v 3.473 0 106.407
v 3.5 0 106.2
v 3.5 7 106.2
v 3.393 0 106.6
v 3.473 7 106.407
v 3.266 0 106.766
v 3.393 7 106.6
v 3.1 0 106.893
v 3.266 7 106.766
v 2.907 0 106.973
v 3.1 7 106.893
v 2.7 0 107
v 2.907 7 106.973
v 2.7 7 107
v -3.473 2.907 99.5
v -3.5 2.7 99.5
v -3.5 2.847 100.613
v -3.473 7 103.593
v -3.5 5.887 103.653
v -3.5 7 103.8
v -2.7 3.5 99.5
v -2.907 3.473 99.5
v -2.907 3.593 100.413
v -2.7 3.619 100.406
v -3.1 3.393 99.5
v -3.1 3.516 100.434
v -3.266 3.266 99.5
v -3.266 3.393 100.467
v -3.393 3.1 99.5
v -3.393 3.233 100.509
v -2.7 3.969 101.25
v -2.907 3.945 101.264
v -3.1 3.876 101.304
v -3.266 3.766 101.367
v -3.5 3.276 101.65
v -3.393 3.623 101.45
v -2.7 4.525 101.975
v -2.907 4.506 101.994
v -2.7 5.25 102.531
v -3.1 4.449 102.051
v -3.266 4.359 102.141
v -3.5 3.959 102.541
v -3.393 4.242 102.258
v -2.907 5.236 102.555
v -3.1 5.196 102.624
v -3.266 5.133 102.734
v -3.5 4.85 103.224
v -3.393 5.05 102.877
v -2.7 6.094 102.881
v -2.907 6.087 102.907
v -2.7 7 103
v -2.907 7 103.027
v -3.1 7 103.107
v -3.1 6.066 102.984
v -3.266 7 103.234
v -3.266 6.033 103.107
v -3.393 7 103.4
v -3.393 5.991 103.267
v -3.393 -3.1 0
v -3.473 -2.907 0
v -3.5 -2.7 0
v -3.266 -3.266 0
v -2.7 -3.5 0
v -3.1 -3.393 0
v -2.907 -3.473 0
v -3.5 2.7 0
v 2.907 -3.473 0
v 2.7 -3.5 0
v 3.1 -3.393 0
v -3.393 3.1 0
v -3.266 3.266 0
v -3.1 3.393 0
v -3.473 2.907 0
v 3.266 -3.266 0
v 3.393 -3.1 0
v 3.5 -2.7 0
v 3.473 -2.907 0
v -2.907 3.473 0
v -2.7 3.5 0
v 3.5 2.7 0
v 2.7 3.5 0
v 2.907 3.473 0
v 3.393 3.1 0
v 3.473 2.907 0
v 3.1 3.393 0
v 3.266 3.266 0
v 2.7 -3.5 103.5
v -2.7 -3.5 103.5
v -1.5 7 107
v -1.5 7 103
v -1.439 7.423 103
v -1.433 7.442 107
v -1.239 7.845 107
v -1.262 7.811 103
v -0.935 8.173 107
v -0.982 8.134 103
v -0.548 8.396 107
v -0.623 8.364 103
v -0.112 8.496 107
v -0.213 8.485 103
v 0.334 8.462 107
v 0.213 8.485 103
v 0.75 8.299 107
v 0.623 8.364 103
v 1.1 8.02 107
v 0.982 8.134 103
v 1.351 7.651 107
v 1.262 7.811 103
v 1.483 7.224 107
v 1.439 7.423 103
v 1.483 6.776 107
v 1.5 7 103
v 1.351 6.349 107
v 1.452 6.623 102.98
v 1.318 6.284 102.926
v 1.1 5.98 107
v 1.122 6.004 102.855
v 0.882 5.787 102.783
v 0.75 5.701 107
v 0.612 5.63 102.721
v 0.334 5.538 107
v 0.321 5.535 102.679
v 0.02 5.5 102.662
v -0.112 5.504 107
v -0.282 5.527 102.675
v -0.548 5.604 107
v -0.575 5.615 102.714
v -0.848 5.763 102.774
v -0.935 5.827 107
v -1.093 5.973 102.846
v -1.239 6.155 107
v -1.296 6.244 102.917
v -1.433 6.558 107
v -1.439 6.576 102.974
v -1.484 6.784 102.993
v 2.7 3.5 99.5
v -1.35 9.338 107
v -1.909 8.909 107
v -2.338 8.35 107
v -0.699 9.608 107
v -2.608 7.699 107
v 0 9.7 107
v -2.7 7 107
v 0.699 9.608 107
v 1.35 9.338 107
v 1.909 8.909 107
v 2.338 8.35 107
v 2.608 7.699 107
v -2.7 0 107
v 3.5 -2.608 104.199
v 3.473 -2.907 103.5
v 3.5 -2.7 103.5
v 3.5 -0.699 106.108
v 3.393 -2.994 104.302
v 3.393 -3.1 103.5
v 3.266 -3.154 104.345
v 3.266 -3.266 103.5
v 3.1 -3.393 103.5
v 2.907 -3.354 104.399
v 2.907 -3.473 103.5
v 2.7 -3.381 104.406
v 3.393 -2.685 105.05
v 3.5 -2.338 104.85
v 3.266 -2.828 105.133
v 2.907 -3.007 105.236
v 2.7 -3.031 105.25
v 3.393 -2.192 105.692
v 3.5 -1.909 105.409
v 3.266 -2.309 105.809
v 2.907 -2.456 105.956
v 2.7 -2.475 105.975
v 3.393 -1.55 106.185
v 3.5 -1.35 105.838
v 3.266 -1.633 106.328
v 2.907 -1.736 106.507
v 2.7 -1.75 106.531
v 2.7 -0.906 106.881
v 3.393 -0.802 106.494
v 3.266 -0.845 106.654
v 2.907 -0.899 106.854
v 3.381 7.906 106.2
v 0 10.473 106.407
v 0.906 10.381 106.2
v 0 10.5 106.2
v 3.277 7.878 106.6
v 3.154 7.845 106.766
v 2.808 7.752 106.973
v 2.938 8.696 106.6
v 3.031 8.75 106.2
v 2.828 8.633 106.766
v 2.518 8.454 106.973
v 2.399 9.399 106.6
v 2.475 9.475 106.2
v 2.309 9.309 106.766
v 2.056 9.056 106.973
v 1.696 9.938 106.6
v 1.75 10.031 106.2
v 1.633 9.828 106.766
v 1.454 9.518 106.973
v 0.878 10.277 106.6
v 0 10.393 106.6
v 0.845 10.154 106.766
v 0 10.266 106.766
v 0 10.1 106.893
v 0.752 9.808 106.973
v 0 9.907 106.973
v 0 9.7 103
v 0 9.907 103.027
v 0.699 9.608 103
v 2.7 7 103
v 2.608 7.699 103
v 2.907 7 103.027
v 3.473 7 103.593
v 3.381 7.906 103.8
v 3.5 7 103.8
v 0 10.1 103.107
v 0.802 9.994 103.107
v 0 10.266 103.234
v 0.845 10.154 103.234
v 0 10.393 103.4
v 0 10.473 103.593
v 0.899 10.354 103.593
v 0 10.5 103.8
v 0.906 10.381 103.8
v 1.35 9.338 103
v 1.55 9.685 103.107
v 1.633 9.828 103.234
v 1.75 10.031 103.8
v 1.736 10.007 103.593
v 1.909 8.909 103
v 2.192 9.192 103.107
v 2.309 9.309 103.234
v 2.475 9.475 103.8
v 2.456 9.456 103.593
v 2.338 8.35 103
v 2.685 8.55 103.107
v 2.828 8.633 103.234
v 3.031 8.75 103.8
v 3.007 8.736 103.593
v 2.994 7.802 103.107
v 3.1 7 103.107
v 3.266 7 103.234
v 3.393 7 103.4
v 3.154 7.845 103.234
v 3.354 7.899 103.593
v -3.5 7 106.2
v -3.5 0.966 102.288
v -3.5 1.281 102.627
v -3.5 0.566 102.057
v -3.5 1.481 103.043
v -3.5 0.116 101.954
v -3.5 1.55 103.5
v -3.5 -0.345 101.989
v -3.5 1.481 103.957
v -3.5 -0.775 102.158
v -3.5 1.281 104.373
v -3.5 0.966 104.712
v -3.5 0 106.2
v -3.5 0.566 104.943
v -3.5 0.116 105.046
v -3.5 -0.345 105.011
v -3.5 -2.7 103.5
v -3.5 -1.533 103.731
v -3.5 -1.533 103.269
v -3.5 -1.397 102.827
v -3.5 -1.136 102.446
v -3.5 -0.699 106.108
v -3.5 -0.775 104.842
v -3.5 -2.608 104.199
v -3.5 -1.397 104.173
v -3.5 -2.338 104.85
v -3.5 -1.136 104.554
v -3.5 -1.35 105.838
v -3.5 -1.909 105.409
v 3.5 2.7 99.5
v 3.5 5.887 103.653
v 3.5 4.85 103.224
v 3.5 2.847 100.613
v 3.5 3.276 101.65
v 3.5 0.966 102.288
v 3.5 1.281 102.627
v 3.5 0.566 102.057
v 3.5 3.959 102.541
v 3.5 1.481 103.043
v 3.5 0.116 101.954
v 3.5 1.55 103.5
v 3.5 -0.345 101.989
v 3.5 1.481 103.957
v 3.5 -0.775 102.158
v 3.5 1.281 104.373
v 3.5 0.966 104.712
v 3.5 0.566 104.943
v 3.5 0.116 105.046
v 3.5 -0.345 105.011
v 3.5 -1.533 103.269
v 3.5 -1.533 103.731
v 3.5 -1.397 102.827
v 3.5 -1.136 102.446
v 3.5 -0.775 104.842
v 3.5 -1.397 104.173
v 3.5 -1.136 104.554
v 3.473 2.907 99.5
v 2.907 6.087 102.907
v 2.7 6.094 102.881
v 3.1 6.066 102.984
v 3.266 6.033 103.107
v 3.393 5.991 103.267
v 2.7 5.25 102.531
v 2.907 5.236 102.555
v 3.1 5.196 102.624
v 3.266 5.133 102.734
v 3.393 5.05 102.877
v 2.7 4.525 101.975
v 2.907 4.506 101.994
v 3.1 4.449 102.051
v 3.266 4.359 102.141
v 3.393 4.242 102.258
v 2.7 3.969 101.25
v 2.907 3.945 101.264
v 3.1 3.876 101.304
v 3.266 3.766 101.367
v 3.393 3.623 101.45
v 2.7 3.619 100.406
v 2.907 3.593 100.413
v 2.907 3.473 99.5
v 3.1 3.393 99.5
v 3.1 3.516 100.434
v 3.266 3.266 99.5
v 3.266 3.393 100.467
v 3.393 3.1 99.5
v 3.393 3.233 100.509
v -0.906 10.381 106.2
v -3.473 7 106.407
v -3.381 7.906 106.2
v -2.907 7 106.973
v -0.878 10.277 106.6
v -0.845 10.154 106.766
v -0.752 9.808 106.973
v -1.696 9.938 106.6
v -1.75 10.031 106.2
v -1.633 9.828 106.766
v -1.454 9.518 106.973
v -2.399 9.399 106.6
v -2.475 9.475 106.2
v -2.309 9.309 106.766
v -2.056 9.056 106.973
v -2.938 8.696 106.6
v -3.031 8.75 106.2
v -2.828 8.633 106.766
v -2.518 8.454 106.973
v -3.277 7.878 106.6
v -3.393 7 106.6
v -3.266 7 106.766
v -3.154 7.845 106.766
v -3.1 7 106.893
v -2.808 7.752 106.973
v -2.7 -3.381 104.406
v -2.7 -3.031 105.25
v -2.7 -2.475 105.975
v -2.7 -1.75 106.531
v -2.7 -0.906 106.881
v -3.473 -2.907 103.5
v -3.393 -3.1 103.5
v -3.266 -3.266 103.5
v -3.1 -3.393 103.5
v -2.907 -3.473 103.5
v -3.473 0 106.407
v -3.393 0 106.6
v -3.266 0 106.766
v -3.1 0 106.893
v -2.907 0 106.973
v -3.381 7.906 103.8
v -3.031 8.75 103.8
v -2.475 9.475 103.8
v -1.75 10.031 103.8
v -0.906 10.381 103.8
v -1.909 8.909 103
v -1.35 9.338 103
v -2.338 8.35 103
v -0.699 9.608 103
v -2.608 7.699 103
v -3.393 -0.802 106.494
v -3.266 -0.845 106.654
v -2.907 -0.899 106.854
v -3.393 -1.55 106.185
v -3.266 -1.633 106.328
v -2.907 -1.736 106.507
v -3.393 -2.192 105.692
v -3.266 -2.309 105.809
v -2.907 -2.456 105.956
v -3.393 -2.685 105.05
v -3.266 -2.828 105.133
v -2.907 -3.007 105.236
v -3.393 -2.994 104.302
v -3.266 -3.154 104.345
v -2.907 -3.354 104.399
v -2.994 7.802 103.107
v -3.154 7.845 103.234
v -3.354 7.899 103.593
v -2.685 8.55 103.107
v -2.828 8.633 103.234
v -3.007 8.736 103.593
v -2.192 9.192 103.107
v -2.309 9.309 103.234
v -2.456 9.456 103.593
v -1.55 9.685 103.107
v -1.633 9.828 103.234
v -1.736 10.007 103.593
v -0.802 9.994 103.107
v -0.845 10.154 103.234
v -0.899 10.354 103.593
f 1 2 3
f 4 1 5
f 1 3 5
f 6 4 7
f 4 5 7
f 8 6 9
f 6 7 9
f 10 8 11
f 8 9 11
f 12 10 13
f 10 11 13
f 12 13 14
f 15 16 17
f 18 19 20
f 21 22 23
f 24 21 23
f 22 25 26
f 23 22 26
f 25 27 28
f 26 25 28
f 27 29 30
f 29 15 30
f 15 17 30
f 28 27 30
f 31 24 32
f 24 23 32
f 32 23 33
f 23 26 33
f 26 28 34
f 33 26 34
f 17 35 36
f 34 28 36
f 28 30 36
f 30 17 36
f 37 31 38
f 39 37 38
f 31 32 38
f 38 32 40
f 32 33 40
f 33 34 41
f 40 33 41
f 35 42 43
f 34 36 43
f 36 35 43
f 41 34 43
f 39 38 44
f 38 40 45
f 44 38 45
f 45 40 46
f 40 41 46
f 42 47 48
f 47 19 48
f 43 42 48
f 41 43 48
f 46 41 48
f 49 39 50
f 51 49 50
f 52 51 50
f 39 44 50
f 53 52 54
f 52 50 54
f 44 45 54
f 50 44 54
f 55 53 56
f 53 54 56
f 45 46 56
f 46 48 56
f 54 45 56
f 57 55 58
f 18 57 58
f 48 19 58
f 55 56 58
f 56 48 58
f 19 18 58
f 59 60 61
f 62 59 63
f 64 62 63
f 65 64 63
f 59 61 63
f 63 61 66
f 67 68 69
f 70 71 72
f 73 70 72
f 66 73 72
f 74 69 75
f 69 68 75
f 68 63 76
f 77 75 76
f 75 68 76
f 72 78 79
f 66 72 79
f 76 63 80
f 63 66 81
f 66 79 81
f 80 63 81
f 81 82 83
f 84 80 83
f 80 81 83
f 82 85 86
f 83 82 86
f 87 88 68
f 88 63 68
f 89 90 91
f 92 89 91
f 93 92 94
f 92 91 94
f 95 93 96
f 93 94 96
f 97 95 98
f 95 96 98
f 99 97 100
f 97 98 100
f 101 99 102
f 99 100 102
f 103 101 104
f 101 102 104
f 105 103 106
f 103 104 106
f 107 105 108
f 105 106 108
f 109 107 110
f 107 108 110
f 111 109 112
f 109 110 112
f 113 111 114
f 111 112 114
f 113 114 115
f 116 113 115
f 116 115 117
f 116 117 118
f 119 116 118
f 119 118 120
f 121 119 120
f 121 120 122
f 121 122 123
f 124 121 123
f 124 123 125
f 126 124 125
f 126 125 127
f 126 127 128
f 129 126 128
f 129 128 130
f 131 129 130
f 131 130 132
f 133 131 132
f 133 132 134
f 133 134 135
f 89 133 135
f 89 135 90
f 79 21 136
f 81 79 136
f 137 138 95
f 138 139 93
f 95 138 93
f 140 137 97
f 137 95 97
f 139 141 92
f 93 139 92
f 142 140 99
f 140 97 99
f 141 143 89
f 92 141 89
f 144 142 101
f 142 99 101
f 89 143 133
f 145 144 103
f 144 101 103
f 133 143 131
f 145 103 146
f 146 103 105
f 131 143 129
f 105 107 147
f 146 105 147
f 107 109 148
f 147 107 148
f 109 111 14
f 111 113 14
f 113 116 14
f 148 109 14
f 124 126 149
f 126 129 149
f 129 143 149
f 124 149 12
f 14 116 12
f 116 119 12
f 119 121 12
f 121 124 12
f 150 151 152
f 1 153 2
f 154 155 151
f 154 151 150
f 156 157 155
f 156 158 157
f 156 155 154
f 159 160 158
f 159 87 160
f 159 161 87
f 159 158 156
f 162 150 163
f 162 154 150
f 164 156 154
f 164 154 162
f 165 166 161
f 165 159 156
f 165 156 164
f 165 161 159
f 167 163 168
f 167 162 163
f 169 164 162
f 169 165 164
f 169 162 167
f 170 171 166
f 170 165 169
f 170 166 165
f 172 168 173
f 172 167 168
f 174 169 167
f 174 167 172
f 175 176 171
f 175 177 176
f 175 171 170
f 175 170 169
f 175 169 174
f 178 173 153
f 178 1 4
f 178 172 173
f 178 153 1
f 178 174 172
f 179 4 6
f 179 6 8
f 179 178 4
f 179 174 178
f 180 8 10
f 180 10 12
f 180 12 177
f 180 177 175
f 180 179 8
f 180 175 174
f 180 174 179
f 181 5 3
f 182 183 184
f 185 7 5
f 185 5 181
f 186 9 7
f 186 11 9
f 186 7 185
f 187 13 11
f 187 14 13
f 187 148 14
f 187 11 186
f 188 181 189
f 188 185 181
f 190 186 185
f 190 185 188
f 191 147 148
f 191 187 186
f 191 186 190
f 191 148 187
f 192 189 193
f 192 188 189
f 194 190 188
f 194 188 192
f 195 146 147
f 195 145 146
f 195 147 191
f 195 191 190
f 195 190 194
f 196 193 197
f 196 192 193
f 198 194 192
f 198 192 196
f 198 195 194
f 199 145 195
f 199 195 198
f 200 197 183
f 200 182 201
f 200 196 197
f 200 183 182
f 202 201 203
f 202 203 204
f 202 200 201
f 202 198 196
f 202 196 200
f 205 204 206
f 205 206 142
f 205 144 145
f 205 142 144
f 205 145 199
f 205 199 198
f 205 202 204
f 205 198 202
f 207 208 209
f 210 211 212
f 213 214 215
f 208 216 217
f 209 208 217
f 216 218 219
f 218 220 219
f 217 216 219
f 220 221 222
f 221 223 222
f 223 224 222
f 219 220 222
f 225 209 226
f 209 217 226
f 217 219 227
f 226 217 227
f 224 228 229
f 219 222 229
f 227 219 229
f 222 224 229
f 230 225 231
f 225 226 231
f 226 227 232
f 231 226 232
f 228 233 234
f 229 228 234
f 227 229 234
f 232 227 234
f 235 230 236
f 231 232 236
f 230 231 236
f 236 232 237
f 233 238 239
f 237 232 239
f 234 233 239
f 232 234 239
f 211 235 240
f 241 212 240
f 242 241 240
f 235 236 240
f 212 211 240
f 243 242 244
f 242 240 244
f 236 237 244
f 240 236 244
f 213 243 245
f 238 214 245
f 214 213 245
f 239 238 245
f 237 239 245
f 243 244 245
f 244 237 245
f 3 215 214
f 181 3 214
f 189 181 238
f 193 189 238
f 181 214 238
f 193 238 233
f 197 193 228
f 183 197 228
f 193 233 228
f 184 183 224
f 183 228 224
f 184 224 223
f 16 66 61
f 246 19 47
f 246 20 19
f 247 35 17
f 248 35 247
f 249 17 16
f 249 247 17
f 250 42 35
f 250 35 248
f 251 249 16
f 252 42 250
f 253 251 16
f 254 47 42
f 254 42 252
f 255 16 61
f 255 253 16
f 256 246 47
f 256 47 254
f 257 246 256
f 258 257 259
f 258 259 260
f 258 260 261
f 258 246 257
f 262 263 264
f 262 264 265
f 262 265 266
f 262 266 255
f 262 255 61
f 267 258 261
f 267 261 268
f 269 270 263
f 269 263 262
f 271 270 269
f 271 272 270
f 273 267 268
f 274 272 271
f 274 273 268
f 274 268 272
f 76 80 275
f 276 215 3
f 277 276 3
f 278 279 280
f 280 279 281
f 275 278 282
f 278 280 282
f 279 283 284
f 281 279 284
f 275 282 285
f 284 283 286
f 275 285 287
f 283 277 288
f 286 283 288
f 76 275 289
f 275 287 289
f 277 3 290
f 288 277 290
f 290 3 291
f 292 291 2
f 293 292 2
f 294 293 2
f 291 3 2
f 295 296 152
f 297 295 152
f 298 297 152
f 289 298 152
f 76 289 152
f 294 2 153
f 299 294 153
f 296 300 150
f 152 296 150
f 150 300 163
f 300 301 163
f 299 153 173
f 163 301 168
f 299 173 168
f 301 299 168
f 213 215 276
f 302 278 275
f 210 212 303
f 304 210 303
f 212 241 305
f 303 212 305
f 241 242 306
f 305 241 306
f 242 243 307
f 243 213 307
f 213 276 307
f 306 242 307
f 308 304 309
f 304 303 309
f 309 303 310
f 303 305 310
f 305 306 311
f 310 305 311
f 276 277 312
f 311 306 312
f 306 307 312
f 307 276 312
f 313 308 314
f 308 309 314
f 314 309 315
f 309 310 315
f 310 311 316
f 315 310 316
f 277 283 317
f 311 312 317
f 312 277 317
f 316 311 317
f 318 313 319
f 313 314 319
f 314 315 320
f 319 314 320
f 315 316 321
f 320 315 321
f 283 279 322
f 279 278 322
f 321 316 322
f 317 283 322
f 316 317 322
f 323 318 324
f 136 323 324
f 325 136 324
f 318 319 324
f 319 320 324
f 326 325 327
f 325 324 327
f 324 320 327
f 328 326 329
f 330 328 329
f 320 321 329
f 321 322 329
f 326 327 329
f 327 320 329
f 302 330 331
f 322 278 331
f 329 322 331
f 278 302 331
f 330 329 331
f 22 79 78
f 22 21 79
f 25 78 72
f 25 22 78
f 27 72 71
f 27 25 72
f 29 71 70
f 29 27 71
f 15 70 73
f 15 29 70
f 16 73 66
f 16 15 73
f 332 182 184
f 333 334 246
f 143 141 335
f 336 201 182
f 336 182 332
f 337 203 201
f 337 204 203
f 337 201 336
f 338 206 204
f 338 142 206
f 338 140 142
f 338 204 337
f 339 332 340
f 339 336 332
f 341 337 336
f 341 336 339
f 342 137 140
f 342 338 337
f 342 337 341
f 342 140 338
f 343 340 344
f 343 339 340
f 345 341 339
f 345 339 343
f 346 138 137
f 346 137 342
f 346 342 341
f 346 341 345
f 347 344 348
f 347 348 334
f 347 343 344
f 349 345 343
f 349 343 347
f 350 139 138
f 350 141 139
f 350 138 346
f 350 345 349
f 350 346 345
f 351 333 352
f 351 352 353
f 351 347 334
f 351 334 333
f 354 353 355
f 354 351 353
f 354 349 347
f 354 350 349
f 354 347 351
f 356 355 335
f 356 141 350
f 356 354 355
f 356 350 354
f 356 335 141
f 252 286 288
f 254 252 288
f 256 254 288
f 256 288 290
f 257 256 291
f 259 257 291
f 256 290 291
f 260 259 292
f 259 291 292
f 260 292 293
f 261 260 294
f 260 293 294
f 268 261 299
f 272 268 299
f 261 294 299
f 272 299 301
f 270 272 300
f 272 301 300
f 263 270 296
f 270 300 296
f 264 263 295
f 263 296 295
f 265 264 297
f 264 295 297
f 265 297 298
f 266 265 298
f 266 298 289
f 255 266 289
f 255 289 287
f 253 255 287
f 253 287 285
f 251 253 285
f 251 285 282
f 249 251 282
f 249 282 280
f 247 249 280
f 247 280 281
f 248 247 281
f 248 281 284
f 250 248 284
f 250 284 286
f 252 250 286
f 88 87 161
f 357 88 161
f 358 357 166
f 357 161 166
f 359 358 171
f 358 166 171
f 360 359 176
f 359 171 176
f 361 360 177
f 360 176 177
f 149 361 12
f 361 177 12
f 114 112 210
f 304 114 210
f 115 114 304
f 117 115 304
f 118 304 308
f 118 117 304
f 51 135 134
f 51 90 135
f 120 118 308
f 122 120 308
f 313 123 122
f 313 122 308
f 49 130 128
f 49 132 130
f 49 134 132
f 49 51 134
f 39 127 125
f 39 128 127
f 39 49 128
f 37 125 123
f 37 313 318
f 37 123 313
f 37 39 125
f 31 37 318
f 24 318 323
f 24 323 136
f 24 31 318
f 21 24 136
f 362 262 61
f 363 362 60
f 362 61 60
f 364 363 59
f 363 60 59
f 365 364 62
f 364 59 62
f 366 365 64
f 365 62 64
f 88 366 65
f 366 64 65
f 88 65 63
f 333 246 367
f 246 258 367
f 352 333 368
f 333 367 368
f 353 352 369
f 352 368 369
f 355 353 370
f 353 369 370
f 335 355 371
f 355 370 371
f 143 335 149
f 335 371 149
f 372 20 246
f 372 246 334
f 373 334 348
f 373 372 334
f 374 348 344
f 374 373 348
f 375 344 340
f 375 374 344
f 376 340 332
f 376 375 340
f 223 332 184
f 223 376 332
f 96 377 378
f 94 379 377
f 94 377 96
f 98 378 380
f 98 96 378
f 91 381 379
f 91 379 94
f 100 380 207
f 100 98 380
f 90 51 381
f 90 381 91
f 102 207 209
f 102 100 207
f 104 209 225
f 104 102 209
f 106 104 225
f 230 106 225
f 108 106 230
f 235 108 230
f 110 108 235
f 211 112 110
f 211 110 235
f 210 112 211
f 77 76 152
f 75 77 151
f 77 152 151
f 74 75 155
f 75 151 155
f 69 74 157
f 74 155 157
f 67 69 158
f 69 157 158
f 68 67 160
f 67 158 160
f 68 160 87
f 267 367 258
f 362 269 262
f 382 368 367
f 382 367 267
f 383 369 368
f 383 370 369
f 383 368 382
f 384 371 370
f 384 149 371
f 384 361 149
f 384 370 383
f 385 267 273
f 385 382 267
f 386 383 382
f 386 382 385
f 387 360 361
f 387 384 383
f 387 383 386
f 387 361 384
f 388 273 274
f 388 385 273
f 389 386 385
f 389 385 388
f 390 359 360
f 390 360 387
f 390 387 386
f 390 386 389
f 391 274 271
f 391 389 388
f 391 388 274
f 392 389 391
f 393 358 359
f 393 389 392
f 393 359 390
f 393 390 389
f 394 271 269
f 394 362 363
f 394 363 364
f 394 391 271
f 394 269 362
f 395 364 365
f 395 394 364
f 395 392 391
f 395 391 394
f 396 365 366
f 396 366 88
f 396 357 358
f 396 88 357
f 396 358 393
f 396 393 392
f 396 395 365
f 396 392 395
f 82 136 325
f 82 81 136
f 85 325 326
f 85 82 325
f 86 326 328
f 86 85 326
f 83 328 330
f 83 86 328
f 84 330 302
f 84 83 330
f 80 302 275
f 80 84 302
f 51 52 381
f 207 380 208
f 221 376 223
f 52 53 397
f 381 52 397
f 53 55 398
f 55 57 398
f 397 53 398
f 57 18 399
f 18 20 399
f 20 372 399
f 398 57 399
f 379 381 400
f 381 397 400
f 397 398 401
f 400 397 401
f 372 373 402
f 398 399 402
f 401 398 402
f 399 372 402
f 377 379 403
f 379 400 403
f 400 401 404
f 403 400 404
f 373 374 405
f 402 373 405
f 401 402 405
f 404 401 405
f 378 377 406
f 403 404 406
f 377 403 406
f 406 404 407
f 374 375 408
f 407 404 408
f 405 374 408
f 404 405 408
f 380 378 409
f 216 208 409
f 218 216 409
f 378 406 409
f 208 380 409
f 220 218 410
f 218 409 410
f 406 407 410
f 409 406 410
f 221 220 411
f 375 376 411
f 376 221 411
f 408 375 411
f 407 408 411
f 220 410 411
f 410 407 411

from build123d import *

# Parameters (mm, degrees)
SKETCH_1_W          = 7
SKETCH_1_H          = 7
EXTRUDE_1_DEPTH     = 107
FILLET_1_R          = 3.5
SKETCH_5_R          = 1.55
CUT_EXTRUDE_2_DEPTH = 108.285833175
SKETCH_6_W          = 7
SKETCH_6_H          = 4
EXTRUDE_2_DEPTH     = 7
FILLET_2_R          = 3.5
SKETCH_7_R          = 1.5
CUT_EXTRUDE_3_DEPTH = 104.592953428
FILLET_3_R          = 3.5
FILLET_4_R          = 0.8
FILLET_5_R          = 0.8


# Some blends are built 0.0001 mm under size
with BuildPart() as part:
    # 草图1 → 凸台-拉伸1 (new body)
    with BuildSketch(Plane.XY):
        Rectangle(SKETCH_1_W, SKETCH_1_H)
    extrude(amount=EXTRUDE_1_DEPTH)

    # 圆角1
    fillet_1_edges = [part.edges().sort_by_distance(p)[0] for p in [
        (0, -3.5, 107),
    ]]
    fillet(fillet_1_edges, radius=FILLET_1_R)

    # 草图5 → 切除-拉伸2 (cut, through all)
    with BuildSketch(Plane(origin=(3.5, 0, 0), x_dir=(0, 0, -1), z_dir=(1, 0, 0))):
        with Locations(Location((-103.5, 0, 0), (0, 0, 90))):
            Circle(SKETCH_5_R)
    extrude(amount=-CUT_EXTRUDE_2_DEPTH, mode=Mode.SUBTRACT)

    # 草图6 → 凸台-拉伸2 (add)
    with BuildSketch(Plane(origin=(0, 3.5, 0), x_dir=(1, 0, 0), z_dir=(0, 1, 0))):
        with Locations((0, -105)):
            Rectangle(SKETCH_6_W, SKETCH_6_H)
    extrude(amount=EXTRUDE_2_DEPTH)

    # 圆角2
    fillet_2_edges = [part.edges().sort_by_distance(p)[0] for p in [
        (3.5, 10.5, 105),
        (-3.5, 10.5, 105),
    ]]
    fillet(fillet_2_edges, radius=FILLET_2_R - 0.0001)  # a hair under: the kernel refuses the full size

    # 草图7 → 切除-拉伸3 (cut, through all)
    with BuildSketch(Plane(origin=(0, 0, 103), x_dir=(-1, 0, 0), z_dir=(0, 0, -1))):
        with Locations((0, 7)):
            Circle(SKETCH_7_R)
    extrude(amount=-CUT_EXTRUDE_3_DEPTH, mode=Mode.SUBTRACT)

    # 圆角3
    # the kernel refuses this fillet: 3.5 mm, written as the material it adds along each edge
    with BuildSketch(Plane(origin=(-3.5, 3.5, 103), x_dir=(0, 1, 0), z_dir=(1, 0, 0))) as fillet_3_piece_1_section:
        with BuildLine():
            CenterArc((FILLET_3_R, -FILLET_3_R), FILLET_3_R, 90, 90)
            Line((0, -FILLET_3_R), (0, 0))
            Line((0, 0), (FILLET_3_R, 0))
        make_face()
    fillet_3_piece_1 = extrude(amount=7, mode=Mode.PRIVATE)
    fillet_3_piece_1 = fillet_3_piece_1 - Plane(origin=(0, 7, 102.188347769), x_dir=(-1, 0, 0), z_dir=(0, 0, -1)) * Cylinder(1.5, 28, mode=Mode.PRIVATE)
    add(fillet_3_piece_1)

    # 圆角4
    fillet_4_edges = [part.edges().sort_by_distance(p)[0] for p in [
        (-2.474903023, 9.474903023, 103),
        (2.474903023, 9.474903023, 103),
        (3.5, 3.5, 49.75),
        (-3.5, 3.5, 49.75),
        (-3.5, 4.525126266, 101.974873734),
        (3.5, 4.525126266, 101.974873734),
    ]]
    fillet(fillet_4_edges, radius=FILLET_4_R)

    # 圆角5
    fillet_5_edges = [part.edges().sort_by_distance(p)[0] for p in [
        (3.5, 3.50005, 107),
        (3.5, -3.5, 51.75),
        (3.5, -2.474873734, 105.974873734),
        (-3.5, -3.5, 51.75),
        (-3.5, -2.474873734, 105.974873734),
        (-3.5, 3.50005, 107),
        (-2.474903023, 9.474903023, 107),
        (2.474903023, 9.474903023, 107),
    ]]
    fillet(fillet_5_edges, radius=FILLET_5_R)


solid = part.part
